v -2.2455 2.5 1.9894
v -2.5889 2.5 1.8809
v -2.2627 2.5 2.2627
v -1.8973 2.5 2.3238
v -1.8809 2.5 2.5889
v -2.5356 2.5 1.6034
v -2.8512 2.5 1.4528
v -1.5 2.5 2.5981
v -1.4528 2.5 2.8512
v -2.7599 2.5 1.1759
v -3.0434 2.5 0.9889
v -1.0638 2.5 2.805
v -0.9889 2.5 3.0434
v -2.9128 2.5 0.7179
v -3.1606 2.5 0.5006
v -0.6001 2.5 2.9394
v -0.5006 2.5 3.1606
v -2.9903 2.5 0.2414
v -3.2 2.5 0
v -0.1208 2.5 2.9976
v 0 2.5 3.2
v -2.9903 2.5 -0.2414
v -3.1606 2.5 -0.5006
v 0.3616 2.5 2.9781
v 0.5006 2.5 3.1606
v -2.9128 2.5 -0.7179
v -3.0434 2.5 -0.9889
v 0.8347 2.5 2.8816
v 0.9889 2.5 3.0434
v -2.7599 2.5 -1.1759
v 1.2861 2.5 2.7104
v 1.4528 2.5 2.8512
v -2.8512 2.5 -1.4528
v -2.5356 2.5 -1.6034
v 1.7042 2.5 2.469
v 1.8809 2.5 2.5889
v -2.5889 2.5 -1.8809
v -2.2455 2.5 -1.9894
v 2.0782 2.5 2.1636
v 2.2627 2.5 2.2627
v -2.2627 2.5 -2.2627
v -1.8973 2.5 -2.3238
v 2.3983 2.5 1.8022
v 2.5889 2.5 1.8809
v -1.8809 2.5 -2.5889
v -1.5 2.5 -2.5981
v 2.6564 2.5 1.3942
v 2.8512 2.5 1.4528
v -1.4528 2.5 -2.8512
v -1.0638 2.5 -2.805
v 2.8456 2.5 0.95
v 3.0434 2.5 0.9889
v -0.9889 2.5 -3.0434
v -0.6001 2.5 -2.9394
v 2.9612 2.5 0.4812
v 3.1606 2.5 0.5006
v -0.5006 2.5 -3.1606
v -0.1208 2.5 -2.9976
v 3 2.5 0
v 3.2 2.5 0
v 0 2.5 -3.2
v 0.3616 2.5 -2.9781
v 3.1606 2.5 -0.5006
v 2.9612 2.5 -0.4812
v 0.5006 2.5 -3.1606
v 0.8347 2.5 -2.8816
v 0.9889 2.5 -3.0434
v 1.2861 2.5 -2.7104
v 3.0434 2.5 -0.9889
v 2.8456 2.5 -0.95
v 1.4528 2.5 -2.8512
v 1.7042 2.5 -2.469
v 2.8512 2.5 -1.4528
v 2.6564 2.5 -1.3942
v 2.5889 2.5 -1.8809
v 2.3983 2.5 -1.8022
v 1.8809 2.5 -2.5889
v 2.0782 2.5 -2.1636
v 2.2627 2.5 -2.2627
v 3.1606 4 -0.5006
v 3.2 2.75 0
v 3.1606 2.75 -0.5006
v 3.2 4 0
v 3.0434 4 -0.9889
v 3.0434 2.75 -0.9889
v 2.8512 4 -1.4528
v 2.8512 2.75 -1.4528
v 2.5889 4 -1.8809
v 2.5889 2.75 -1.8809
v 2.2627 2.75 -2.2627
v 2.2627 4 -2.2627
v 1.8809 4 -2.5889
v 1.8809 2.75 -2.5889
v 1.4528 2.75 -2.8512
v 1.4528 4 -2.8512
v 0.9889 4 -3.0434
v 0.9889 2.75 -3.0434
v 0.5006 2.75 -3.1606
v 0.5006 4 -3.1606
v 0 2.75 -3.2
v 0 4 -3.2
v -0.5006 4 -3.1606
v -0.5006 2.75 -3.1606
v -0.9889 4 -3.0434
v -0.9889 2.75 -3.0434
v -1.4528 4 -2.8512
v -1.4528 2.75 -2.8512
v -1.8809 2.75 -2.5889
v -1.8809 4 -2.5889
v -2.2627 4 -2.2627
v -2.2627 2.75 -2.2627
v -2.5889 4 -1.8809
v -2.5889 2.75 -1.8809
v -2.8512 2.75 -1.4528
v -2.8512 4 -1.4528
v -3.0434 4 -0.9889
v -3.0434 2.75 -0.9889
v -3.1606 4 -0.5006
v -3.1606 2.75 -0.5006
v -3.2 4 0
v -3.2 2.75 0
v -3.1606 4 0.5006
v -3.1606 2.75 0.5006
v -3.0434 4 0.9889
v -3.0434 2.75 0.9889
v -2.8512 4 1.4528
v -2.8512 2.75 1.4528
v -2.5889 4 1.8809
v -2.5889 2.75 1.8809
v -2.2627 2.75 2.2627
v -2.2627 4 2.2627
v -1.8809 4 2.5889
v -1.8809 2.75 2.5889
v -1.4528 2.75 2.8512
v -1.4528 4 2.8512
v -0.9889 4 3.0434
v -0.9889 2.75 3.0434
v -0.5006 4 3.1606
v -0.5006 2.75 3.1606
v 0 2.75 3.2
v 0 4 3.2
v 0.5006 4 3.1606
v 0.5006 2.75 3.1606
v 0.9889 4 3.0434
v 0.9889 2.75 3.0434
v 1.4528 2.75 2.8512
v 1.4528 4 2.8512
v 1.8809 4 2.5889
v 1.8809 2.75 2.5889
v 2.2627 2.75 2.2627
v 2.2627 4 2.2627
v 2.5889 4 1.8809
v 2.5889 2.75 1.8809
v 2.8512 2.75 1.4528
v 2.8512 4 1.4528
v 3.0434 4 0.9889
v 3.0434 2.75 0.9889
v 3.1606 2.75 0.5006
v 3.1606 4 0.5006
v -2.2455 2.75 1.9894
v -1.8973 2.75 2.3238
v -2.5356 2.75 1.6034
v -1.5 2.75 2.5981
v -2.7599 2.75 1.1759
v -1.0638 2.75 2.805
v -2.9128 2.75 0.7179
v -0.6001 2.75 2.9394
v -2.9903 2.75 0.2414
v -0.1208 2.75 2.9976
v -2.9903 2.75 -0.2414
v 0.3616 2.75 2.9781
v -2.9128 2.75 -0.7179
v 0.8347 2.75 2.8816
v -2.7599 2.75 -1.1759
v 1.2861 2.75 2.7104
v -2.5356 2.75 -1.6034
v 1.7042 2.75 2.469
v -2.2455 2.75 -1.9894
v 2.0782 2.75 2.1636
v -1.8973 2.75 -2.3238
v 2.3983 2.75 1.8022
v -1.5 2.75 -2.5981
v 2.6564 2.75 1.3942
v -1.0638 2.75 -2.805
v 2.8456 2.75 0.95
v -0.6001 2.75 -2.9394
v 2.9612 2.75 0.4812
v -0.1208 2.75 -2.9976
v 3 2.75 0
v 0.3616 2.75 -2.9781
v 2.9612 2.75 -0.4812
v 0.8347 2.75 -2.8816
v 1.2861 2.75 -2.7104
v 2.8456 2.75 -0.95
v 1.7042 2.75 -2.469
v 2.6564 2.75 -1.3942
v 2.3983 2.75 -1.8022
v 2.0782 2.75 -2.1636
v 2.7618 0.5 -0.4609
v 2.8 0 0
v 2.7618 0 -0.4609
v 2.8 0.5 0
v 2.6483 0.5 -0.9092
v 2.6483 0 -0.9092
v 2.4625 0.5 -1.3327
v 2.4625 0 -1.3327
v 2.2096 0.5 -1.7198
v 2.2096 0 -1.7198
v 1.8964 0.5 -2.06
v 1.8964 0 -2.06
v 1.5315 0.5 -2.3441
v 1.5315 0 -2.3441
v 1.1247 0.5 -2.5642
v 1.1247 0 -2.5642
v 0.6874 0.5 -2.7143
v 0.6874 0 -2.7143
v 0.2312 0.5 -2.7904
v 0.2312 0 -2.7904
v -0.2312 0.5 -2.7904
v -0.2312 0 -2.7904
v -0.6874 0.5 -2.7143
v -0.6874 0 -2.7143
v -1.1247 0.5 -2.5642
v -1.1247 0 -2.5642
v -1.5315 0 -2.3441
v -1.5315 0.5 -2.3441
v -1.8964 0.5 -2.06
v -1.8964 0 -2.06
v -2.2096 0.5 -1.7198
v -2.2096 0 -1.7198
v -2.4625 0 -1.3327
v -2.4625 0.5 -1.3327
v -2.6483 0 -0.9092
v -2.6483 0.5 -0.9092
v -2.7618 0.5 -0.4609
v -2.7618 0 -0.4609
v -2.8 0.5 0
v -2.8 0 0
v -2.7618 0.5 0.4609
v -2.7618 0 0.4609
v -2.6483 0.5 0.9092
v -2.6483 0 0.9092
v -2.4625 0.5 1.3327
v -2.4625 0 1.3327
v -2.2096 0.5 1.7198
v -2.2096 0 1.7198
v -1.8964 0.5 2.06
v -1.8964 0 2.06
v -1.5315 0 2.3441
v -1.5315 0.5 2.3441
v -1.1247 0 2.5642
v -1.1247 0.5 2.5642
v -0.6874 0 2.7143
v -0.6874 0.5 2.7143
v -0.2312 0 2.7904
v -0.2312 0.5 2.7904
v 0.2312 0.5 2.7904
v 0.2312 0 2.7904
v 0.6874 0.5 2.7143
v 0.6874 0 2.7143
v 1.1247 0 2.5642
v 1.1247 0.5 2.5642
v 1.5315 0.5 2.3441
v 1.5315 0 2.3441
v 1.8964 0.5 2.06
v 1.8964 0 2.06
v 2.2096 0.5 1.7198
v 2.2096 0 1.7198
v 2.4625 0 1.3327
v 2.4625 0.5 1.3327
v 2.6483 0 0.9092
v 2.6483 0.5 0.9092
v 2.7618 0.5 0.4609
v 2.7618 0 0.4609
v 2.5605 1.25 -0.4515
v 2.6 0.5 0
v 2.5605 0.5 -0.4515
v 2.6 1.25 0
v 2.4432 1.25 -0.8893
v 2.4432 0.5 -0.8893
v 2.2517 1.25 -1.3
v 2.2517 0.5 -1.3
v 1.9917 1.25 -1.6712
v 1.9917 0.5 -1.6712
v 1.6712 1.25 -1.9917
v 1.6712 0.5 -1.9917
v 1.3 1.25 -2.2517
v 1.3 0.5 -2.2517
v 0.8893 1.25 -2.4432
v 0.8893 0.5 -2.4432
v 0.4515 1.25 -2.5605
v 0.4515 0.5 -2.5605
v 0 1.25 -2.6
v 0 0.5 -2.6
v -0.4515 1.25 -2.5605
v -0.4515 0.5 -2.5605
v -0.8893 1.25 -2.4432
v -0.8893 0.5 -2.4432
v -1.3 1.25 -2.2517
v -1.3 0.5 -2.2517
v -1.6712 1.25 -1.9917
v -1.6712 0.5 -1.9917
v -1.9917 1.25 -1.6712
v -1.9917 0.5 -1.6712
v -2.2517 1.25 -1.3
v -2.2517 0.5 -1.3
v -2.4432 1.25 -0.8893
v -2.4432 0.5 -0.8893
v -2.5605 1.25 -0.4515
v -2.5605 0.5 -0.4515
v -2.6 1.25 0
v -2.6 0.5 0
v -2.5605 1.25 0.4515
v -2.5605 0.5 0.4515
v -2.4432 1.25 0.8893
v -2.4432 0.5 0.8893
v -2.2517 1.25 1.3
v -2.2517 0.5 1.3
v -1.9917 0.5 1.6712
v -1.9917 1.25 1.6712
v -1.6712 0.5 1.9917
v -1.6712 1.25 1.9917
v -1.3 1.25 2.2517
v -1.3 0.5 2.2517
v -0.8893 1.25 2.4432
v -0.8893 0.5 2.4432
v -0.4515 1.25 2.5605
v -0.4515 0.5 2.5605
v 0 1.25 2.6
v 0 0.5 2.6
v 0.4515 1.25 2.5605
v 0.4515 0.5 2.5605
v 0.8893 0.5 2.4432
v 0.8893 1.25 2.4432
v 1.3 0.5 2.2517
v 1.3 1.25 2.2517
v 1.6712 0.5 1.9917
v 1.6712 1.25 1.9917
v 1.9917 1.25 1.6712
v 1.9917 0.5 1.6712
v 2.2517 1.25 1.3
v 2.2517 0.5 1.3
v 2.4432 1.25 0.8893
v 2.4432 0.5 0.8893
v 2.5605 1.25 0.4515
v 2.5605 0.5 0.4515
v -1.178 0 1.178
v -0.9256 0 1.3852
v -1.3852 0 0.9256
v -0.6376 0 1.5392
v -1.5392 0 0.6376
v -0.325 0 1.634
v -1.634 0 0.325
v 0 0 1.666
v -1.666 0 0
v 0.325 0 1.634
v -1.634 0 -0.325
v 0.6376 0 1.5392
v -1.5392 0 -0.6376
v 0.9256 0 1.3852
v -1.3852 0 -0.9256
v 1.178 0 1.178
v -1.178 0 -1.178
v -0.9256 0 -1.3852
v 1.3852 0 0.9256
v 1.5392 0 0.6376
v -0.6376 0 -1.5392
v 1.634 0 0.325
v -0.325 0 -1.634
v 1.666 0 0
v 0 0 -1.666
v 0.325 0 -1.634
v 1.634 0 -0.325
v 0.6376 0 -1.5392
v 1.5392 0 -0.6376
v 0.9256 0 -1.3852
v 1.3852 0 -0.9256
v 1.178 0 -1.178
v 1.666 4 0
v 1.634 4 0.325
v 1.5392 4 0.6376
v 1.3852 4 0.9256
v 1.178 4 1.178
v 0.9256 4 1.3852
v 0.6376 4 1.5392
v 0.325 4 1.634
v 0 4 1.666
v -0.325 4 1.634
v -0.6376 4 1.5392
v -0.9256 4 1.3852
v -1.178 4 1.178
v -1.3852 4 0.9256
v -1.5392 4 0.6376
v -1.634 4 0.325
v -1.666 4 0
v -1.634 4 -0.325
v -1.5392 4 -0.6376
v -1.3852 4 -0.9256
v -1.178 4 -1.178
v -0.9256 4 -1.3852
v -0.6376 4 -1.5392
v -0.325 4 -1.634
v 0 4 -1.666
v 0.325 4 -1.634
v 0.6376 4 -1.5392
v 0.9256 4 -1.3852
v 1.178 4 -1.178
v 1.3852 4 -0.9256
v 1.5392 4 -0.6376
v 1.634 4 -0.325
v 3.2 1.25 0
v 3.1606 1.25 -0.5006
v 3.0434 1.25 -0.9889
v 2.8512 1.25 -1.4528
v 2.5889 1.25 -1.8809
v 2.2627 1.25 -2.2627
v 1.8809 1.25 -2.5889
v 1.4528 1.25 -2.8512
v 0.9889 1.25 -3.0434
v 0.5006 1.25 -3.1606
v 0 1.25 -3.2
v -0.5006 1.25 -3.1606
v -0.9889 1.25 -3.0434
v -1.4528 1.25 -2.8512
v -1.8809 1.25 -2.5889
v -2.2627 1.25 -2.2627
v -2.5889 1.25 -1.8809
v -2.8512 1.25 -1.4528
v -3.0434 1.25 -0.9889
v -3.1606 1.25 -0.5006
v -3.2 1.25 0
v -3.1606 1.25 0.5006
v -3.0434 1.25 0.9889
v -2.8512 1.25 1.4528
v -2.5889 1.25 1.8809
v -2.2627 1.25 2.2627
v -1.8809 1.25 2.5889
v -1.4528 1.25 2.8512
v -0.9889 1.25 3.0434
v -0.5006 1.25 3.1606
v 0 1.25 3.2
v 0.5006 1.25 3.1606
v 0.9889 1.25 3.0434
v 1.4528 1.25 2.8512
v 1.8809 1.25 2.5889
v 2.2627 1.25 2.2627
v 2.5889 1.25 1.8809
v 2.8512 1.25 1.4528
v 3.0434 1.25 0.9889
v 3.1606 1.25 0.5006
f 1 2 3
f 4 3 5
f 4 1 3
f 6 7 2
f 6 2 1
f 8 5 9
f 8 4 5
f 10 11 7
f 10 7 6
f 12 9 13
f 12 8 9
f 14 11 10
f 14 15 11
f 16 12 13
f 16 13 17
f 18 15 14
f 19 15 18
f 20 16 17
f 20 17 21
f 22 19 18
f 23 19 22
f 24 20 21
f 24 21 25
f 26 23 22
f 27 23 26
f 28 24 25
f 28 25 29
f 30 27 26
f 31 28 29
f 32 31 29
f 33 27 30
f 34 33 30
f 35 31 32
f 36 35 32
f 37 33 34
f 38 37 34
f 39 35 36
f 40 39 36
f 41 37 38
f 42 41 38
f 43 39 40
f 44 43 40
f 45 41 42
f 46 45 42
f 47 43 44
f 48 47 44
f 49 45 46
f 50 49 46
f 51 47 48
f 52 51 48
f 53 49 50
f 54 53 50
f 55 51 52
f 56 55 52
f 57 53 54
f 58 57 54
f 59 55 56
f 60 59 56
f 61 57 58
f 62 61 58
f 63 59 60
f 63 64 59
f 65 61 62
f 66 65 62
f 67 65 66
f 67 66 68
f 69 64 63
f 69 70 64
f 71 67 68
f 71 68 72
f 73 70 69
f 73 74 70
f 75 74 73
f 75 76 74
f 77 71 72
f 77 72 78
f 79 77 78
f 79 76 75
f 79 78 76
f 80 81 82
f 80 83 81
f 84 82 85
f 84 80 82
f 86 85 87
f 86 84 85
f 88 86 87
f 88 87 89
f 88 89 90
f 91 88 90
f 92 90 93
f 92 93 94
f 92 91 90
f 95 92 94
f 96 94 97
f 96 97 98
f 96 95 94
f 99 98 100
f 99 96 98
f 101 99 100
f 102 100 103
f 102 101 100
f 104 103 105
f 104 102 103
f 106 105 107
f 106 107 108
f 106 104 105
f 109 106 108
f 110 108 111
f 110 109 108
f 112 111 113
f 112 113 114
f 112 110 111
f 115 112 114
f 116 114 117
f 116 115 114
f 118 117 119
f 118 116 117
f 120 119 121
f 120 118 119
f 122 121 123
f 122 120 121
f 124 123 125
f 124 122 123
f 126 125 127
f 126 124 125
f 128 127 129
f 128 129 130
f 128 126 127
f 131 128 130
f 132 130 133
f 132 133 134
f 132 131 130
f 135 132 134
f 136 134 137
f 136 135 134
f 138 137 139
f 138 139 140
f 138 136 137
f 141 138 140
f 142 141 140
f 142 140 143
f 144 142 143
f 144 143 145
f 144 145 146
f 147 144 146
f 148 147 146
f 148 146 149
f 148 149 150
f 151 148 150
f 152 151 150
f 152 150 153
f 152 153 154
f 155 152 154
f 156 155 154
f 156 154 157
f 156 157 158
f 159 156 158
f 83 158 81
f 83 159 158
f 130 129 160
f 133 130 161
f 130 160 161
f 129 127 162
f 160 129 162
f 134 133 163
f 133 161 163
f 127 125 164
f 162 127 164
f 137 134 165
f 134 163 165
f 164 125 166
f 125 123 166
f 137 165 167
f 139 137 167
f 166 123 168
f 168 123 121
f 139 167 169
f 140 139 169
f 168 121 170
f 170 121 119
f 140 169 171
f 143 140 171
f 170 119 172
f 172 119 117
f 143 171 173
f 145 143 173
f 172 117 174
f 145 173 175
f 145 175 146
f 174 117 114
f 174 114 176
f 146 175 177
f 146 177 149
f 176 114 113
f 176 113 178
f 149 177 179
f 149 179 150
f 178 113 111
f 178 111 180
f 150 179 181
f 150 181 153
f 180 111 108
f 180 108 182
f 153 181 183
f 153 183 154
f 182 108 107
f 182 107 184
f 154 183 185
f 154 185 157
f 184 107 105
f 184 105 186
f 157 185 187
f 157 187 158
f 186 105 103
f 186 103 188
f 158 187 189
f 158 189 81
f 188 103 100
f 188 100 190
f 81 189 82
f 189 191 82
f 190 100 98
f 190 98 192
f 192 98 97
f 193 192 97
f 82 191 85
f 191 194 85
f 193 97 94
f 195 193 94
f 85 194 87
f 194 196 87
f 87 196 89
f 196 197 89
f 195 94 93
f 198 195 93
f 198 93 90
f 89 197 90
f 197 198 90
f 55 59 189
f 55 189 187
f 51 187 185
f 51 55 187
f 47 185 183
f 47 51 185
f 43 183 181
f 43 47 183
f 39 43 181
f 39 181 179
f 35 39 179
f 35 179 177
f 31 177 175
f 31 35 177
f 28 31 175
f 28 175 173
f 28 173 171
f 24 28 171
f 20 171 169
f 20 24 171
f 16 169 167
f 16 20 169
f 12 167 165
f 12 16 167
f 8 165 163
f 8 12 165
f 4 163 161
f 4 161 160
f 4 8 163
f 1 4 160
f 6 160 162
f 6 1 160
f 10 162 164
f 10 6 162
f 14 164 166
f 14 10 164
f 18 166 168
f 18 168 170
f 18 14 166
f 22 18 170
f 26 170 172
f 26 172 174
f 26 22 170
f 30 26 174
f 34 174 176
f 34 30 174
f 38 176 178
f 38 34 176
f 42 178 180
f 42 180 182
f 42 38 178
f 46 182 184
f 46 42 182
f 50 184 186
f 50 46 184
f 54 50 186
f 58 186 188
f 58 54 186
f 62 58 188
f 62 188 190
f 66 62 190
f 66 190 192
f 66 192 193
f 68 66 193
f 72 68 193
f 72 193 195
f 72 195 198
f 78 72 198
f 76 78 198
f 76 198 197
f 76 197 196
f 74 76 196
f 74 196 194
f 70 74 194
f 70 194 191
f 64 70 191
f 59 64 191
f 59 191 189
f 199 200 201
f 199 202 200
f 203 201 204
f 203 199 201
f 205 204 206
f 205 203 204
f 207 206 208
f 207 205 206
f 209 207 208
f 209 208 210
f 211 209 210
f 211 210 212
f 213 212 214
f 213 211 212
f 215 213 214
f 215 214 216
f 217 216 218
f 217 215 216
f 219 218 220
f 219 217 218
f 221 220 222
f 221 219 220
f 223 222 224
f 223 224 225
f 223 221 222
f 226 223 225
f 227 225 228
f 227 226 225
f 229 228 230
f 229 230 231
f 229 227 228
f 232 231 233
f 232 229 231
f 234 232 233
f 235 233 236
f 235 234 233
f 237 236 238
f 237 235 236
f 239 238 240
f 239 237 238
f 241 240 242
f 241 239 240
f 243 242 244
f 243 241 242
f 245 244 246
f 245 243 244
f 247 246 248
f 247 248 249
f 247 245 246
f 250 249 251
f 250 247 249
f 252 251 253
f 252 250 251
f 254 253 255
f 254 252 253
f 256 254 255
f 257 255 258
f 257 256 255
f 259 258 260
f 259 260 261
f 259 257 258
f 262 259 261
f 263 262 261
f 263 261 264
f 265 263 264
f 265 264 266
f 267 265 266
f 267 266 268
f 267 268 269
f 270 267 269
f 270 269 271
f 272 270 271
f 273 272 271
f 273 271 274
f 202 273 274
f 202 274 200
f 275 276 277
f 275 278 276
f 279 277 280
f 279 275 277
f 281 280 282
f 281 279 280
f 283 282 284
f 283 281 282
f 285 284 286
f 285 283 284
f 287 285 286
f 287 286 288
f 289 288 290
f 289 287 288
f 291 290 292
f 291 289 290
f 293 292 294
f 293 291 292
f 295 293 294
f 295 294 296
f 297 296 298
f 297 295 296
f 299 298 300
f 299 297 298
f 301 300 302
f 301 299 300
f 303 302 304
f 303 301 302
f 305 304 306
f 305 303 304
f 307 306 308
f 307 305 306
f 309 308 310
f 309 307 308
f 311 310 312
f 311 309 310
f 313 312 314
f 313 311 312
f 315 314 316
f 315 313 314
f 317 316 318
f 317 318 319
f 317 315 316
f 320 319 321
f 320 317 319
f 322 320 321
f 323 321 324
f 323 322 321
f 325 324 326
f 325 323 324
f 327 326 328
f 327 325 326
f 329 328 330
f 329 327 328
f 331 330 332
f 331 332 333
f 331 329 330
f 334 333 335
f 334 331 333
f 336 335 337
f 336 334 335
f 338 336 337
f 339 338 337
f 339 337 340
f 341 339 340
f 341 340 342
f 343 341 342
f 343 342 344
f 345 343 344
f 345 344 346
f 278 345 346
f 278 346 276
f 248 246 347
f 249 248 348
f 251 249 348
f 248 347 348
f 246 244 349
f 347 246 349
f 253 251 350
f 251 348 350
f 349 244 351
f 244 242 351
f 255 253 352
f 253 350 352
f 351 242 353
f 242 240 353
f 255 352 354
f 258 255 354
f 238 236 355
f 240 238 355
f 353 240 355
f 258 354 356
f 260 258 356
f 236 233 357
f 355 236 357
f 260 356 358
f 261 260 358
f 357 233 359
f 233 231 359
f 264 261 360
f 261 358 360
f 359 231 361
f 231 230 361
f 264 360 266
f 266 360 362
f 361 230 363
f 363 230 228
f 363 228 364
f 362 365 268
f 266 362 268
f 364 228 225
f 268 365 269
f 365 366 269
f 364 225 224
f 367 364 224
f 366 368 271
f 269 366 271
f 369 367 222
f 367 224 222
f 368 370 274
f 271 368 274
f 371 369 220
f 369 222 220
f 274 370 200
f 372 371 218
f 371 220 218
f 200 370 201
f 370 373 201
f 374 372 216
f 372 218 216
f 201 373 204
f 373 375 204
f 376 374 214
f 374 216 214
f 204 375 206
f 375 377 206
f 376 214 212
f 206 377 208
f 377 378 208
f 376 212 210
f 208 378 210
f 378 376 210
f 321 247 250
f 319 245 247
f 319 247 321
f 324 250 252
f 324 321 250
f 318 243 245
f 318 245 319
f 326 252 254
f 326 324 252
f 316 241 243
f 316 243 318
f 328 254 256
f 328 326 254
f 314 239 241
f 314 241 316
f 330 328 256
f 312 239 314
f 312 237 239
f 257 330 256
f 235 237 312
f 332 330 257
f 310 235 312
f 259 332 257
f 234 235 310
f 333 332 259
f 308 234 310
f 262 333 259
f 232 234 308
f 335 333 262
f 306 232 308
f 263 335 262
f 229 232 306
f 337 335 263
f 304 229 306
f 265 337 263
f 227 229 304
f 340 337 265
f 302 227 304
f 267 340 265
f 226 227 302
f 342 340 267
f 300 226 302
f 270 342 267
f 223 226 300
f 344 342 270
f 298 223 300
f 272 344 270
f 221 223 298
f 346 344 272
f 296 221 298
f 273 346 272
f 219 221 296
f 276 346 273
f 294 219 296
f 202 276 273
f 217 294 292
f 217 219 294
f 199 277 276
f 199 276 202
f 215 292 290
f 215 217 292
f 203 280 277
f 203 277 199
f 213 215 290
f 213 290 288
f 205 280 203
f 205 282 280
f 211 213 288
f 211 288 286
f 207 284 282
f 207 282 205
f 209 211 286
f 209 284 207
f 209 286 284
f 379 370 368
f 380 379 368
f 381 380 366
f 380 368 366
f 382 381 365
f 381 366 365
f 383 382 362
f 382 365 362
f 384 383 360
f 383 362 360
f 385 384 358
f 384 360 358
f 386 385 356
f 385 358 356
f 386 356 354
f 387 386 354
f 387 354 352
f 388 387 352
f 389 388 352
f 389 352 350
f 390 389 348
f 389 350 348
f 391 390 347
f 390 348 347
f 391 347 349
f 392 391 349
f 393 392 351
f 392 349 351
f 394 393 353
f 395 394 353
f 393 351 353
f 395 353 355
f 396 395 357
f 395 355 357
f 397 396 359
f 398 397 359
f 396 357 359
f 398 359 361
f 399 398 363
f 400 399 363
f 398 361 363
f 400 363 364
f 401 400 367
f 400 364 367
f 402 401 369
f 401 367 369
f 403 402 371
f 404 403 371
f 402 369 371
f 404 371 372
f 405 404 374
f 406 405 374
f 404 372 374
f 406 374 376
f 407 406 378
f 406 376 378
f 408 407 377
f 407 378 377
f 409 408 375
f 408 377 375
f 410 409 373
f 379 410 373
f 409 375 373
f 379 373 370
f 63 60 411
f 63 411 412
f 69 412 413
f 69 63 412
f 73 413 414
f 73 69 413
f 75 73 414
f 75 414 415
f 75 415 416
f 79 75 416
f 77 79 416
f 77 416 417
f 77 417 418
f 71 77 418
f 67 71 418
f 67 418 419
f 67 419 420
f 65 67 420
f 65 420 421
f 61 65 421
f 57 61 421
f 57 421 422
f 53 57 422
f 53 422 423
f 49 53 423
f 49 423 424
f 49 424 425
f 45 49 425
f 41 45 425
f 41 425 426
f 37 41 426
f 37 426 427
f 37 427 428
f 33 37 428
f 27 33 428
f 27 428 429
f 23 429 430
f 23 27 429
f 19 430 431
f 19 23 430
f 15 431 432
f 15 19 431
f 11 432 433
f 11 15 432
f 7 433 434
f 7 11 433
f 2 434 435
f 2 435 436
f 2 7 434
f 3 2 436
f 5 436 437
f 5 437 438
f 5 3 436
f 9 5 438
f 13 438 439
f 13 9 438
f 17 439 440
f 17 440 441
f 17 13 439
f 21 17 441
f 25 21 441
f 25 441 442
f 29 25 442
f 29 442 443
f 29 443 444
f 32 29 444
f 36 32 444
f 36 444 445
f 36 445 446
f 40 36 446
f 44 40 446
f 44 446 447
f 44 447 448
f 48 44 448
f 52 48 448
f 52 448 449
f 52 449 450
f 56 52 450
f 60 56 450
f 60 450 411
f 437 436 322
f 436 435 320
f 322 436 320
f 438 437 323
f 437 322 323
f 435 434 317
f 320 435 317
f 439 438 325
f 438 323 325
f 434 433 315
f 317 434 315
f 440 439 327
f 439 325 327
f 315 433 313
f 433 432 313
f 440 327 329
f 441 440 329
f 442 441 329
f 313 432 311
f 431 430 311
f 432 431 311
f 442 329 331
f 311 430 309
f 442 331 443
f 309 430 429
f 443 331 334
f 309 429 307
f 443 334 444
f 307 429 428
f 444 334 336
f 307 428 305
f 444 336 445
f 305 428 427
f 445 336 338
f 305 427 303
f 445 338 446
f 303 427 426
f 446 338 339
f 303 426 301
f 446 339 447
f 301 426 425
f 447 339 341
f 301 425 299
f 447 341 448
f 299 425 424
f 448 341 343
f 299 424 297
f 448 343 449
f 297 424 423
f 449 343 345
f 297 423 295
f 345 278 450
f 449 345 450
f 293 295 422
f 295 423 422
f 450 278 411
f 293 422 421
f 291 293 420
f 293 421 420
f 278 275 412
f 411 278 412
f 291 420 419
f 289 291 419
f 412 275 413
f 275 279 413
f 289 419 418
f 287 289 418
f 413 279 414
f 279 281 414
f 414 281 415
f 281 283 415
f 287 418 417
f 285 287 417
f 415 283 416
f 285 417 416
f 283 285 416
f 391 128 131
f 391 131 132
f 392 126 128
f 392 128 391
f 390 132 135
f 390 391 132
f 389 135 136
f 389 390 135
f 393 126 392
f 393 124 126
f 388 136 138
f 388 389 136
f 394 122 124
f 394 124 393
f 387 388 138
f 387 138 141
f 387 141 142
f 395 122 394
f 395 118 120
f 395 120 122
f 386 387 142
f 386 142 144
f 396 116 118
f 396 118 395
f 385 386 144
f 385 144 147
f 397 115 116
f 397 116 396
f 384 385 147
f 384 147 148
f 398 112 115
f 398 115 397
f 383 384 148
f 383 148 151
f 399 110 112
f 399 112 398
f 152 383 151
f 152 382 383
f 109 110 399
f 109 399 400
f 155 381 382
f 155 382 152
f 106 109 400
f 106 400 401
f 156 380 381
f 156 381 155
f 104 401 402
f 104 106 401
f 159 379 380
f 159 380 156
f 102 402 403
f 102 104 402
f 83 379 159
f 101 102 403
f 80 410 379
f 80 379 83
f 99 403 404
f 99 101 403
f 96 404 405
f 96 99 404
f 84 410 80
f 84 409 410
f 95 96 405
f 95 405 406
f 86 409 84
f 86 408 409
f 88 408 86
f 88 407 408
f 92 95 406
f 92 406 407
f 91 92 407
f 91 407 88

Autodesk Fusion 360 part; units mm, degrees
sketch "Sketch1" plane through (0, 0, 0) normal (0, 0, 1) x (1, 0, 0)
  line L0 (2, 0) -> (2.8, 0)
  line L1 (2.8, 0) -> (2.8, 0.5)
  line L2 (2.8, 0.5) -> (2.6, 0.5)
  line L3 (2.6, 0.5) -> (2.6, 1.25)
  line L4 (2.6, 1.25) -> (3.2, 1.25)
  line L5 (3.2, 4) -> (2, 4)
  line L6 (2, 4) -> (2, 0)
  line L7 (3.2, 2.75) -> (3, 2.75)
  line L8 (3, 2.75) -> (3, 2.5)
  line L9 (3, 2.5) -> (3.2, 2.5)
  line L10 (3.2, 1.25) -> (3.2, 2.5)
  line L11 (3.2, 2.75) -> (3.2, 4)
  dimension "d1" = 4
  dimension "d6" = 2
  dimension "d7" = 2.8
  dimension "d8" = 3.2
  dimension "d9" = 2.75
  dimension "d10" = 0.5
  dimension "d11" = 0.25
  dimension "d12" = 0.2
  dimension "d13" = 0.2
revolve "Revolve1" add sketch "Sketch1" angle 360 about axis through (0, 1.75, 0) along (0, 1, 0)
thread "Thread1" "ISO Metric profile 4.0 M4x0.7 6H" major diameter 4.1095 minor diameter 3.332 pitch 0.7 angle 60 resizes the face on face at (1.9975, 1.3333, 0.0997)
equation "d7 = ( 5.6 / 2 ) * 1 mm"
equation "d8 = ( 6.4 / 2 ) * 1 mm"
